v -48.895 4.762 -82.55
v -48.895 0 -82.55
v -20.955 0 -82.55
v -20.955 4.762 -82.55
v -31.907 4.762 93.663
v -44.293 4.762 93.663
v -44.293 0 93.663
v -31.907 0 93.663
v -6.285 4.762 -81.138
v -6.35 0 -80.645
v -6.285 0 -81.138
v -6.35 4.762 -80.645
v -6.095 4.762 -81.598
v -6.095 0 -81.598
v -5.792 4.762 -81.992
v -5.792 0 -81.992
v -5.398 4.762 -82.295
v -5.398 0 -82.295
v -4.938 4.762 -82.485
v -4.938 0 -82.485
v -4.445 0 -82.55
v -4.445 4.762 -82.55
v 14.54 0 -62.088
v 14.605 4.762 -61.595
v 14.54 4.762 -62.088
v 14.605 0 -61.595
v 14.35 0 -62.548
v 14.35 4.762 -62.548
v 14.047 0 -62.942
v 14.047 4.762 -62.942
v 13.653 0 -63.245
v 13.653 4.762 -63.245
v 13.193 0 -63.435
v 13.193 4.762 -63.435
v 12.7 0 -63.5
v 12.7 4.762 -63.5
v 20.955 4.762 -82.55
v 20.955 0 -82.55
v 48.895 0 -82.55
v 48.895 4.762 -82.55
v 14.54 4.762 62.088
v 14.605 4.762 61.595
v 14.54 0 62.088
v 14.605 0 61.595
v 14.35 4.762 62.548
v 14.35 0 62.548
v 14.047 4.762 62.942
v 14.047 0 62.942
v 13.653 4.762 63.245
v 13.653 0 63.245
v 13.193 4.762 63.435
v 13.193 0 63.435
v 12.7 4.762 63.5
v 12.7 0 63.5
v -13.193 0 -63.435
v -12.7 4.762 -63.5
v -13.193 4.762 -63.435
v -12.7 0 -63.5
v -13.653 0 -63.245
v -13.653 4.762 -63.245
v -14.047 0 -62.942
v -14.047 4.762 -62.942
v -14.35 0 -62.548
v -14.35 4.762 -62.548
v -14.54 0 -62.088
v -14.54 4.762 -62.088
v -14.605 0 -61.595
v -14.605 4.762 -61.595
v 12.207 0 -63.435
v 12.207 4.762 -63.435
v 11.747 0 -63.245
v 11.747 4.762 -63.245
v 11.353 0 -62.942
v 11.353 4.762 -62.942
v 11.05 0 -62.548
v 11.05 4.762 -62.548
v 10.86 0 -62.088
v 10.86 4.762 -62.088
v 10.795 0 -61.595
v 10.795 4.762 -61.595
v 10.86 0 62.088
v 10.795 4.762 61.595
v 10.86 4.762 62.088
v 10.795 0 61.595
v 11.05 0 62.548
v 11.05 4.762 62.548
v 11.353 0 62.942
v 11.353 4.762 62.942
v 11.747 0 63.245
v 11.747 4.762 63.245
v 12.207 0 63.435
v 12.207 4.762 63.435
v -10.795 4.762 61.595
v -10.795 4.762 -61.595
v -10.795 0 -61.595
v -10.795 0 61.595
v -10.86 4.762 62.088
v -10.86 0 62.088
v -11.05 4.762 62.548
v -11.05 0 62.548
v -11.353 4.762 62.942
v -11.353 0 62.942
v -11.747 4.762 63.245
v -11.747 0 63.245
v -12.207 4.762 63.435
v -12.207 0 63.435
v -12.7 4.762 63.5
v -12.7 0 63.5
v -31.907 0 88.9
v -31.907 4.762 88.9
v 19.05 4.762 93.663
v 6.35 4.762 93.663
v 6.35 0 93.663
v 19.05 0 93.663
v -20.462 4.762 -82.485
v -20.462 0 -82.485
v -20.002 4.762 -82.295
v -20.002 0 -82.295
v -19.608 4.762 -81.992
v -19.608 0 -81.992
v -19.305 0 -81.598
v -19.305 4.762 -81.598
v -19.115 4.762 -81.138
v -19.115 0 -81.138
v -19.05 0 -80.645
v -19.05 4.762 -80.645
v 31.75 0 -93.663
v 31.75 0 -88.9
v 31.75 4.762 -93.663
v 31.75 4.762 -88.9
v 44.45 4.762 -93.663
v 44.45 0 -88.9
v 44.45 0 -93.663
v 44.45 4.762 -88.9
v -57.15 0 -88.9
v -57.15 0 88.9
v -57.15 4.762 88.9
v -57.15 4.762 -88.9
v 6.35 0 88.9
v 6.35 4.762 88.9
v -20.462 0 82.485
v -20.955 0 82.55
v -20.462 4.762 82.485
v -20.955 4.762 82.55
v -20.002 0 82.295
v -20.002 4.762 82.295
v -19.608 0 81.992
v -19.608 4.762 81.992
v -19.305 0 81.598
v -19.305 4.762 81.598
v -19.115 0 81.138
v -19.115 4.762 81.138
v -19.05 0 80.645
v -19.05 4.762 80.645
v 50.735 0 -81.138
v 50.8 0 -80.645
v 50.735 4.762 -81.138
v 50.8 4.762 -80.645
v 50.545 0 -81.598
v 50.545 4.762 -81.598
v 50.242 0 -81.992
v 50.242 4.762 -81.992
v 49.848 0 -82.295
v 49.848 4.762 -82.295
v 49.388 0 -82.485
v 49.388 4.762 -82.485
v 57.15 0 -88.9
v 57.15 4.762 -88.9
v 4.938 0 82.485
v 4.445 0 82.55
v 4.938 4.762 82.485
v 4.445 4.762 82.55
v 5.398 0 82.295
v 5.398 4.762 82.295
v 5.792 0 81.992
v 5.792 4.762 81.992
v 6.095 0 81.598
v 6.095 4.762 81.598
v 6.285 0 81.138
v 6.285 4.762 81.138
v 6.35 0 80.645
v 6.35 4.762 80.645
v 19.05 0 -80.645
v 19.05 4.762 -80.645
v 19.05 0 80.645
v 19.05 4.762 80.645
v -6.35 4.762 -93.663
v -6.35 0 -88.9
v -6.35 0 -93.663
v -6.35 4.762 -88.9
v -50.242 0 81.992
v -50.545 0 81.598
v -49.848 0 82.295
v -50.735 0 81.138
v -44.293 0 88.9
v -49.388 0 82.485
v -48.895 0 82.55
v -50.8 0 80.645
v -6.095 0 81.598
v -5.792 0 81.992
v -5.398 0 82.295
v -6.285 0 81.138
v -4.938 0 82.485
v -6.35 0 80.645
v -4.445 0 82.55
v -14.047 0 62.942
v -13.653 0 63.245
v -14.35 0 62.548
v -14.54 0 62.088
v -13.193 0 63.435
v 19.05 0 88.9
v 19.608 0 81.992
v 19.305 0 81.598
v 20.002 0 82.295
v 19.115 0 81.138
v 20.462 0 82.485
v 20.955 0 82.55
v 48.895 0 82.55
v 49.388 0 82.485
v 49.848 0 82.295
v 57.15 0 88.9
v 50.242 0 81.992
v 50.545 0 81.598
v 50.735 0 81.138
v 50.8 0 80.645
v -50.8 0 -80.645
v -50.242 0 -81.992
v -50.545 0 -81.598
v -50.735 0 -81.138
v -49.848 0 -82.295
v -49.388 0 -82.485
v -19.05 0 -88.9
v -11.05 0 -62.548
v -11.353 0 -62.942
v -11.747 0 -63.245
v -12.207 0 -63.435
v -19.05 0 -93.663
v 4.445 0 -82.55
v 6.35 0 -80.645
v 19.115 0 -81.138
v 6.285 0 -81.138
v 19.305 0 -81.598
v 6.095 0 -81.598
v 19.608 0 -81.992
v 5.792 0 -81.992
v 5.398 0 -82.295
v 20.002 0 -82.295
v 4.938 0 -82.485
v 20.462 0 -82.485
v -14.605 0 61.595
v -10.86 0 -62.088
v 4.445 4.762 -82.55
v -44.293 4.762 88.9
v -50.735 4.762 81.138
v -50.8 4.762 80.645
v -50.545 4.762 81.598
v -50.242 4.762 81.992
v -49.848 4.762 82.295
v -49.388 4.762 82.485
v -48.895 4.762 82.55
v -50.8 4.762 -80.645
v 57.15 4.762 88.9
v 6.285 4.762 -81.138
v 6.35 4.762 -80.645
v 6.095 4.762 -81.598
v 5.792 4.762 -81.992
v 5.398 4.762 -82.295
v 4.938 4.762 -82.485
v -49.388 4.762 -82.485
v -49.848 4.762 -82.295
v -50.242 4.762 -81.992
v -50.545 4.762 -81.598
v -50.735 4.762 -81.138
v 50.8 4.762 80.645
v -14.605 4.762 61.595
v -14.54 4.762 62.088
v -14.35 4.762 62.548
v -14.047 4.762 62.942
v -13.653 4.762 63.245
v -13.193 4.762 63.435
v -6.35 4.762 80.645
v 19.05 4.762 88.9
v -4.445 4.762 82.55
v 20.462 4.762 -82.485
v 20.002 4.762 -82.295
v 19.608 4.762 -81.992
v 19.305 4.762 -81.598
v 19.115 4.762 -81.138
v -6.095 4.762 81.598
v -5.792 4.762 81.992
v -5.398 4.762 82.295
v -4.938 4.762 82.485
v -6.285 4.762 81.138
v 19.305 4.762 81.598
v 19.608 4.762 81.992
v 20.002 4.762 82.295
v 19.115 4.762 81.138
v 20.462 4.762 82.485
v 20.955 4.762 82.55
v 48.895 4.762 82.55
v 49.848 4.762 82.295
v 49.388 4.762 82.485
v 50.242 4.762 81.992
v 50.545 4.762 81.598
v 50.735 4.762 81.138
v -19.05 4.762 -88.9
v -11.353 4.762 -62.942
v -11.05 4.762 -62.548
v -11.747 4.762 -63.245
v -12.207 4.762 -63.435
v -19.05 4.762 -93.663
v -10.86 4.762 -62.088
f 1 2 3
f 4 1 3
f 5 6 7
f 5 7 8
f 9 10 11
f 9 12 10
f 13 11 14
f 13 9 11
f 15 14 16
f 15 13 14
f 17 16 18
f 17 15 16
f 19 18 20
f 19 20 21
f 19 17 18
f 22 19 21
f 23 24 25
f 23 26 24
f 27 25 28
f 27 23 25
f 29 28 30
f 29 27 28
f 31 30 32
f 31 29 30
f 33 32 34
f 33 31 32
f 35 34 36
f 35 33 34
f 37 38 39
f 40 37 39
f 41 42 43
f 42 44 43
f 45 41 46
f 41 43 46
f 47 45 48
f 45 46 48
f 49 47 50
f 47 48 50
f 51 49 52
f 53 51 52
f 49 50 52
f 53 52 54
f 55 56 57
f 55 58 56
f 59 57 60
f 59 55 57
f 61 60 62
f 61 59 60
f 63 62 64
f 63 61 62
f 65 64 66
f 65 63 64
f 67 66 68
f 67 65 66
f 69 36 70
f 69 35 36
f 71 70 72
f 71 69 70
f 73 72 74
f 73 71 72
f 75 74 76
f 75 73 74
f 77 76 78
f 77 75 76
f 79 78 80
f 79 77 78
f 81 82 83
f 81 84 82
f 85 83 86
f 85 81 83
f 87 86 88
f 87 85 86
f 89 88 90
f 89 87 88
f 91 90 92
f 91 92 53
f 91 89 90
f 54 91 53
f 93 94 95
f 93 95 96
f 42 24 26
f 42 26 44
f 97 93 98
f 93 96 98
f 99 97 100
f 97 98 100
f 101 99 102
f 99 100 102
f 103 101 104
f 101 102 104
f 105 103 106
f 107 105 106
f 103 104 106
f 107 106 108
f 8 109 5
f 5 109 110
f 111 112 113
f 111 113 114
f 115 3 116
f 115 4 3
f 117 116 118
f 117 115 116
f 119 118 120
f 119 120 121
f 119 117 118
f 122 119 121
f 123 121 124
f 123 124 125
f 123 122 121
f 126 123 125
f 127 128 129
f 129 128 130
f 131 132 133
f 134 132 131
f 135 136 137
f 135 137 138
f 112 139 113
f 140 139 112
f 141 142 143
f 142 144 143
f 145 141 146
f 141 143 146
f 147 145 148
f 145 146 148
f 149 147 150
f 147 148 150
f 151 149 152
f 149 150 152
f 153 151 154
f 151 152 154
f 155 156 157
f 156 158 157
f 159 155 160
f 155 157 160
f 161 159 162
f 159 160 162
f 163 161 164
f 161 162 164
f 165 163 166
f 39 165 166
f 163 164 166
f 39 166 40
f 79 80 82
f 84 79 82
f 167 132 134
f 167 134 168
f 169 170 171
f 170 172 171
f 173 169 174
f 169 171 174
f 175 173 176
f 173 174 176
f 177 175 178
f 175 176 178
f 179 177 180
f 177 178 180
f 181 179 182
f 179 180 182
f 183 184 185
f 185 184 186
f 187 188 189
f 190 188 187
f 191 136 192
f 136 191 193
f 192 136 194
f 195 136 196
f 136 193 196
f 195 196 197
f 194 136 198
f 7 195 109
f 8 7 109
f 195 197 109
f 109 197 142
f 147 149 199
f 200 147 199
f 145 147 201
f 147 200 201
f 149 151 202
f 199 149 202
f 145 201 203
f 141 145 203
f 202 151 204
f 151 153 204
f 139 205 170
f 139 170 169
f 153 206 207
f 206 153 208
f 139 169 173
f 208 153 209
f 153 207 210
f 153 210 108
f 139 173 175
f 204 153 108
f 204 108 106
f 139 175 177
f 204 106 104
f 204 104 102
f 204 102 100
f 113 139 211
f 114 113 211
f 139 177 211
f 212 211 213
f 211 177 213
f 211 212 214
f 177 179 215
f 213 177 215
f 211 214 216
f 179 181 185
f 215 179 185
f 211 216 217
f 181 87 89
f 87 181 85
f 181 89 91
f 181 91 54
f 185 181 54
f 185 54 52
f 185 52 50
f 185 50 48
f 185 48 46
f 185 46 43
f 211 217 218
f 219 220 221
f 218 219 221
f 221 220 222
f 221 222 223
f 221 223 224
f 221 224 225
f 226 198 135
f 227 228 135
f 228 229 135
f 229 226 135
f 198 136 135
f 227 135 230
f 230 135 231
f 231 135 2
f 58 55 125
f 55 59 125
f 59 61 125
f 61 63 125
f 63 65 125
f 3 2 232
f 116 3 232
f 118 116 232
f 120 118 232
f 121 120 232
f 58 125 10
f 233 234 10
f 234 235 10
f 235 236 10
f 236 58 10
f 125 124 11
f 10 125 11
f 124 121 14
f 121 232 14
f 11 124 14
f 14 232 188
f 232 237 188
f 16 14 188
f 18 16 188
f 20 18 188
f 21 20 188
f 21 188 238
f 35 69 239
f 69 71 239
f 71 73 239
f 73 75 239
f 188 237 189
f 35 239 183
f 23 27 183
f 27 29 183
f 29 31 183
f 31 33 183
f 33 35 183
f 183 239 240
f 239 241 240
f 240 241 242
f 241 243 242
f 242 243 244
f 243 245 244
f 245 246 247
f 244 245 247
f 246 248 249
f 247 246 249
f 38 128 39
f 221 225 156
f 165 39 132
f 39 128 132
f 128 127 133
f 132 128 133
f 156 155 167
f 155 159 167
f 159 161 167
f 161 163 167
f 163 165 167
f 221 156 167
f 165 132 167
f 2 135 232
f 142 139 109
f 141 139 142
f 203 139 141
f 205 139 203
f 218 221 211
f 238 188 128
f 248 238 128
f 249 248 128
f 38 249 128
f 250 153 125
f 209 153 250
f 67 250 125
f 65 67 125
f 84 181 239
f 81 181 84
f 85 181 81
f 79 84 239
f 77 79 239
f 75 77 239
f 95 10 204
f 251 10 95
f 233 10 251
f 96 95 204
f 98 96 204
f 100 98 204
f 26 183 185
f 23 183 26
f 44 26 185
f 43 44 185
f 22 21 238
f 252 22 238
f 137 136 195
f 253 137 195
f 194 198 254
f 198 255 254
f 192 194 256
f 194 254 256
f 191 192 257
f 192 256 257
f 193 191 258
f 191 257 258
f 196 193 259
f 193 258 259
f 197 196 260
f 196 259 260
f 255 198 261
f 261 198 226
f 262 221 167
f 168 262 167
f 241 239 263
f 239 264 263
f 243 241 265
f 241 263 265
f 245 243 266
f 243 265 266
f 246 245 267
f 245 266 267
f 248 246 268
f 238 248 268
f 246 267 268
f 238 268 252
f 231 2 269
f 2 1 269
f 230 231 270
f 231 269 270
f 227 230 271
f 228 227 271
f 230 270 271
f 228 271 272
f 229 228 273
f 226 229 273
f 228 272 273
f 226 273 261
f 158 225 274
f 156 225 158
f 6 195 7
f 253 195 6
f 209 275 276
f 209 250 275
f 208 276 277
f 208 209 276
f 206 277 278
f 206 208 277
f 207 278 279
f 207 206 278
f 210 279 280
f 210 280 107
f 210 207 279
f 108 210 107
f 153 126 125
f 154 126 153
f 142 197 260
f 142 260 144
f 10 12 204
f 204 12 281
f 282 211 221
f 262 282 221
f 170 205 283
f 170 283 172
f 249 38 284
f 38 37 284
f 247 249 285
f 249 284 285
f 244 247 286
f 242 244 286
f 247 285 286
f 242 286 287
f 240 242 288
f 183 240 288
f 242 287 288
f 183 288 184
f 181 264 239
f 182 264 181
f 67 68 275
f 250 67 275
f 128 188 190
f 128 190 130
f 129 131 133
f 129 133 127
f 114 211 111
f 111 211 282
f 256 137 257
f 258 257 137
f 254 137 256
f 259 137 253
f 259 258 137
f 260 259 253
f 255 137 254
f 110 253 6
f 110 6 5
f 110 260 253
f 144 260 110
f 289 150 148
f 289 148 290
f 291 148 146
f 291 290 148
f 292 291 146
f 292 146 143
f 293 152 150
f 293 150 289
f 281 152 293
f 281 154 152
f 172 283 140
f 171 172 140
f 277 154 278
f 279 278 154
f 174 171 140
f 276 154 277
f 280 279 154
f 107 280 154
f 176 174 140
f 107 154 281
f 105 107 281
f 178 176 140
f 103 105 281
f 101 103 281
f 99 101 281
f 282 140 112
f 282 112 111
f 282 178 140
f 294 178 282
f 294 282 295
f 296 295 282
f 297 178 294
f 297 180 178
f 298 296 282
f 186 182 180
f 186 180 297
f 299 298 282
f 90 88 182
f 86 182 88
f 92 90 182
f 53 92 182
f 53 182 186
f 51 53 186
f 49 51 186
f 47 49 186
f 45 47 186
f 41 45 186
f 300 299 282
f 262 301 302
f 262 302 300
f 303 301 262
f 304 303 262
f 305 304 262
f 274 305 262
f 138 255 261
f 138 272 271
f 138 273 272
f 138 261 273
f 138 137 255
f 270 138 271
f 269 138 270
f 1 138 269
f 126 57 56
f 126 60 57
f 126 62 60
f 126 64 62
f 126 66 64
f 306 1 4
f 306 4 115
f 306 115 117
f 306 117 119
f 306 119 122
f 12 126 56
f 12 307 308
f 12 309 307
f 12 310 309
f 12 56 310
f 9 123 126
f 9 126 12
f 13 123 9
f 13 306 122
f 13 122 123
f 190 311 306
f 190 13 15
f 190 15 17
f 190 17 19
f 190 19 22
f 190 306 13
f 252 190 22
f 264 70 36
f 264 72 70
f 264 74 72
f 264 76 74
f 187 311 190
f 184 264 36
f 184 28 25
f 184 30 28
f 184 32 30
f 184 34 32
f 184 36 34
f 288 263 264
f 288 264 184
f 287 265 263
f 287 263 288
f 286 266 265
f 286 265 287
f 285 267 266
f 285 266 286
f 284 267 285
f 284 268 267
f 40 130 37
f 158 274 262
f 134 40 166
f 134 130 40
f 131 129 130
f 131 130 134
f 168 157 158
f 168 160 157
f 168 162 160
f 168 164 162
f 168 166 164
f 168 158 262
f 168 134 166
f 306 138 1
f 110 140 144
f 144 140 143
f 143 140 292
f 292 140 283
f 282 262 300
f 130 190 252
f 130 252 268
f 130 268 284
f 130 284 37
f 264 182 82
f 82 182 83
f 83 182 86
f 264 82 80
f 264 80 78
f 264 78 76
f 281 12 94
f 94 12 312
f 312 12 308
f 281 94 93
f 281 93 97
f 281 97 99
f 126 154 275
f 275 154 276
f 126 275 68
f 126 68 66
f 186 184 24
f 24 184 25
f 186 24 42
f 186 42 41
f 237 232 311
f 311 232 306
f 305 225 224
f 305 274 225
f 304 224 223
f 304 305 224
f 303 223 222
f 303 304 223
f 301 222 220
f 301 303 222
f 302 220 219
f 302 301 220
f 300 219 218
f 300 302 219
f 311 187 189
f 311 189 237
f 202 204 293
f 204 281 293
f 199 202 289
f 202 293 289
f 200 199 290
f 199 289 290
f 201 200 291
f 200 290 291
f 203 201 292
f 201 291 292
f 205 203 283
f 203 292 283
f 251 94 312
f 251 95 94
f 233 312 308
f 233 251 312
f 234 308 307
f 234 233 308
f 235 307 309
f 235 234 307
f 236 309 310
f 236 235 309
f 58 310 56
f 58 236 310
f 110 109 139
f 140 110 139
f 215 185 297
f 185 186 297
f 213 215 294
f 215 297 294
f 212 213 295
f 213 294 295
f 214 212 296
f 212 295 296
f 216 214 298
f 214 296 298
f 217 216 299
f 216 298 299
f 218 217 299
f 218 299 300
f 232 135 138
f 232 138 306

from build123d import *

# Parameters (mm, degrees)
SKETCH1_W           = 114.3
SKETCH1_H           = 177.8
SKETCH1_W_2         = 101.6
SKETCH1_H_2         = 165.1
BOSS_EXTRUDE1_DEPTH = 4.7625
SKETCH2_W           = 12.38677804
SKETCH2_H           = 4.7625
SKETCH2_W_2         = 12.7
BOSS_EXTRUDE2_DEPTH = 4.7625
SKETCH3_W           = 12.7
SKETCH3_H           = 4.7625
BOSS_EXTRUDE3_DEPTH = 4.7625
SKETCH4_W           = 12.7
SKETCH4_H           = 177.8
SKETCH4_W_2         = 3.81
SKETCH4_H_2         = 127
BOSS_EXTRUDE4_DEPTH = 4.7625
FILLET1_R           = 1.905


with BuildPart() as part:
    # Sketch1 → Boss-Extrude1 (new body)
    with BuildSketch(Plane(origin=(0, 0, 0), x_dir=(1, 0, 0), z_dir=(0, 1, 0))):
        Rectangle(SKETCH1_W, SKETCH1_H)
        Rectangle(SKETCH1_W_2, SKETCH1_H_2, mode=Mode.SUBTRACT)
    extrude(amount=BOSS_EXTRUDE1_DEPTH)

    # Sketch2 → Boss-Extrude2 (add)
    with BuildSketch(Plane.XY.offset(88.9)):
        with Locations((-38.1, 2.38125)):
            Rectangle(SKETCH2_W, SKETCH2_H)
        with Locations((12.7, 2.38125)):
            Rectangle(SKETCH2_W_2, SKETCH2_H)
    extrude(amount=BOSS_EXTRUDE2_DEPTH)

    # Sketch3 → Boss-Extrude3 (add)
    with BuildSketch(Plane(origin=(0, 0, -88.9), x_dir=(-1, 0, 0), z_dir=(0, 0, -1))):
        with Locations((-38.1, 2.38125)):
            Rectangle(SKETCH3_W, SKETCH3_H)
        with Locations((12.7, 2.38125)):
            Rectangle(SKETCH3_W, SKETCH3_H)
    extrude(amount=BOSS_EXTRUDE3_DEPTH)

    # Sketch4 → Boss-Extrude4 (add)
    # profile 1 of 2: a face of its own
    with BuildSketch(Plane(origin=(0, 4.7625, 0), x_dir=(-1, 0, 0), z_dir=(0, 1, 0))):
        with Locations((12.7, 0)):
            Rectangle(SKETCH4_W, SKETCH4_H)
        with Locations((12.7, 0)):
            Rectangle(SKETCH4_W_2, SKETCH4_H_2, mode=Mode.SUBTRACT)
    # profile 2 of 2: a face of its own
    with BuildSketch(Plane(origin=(0, 4.7625, 0), x_dir=(-1, 0, 0), z_dir=(0, 1, 0))):
        with Locations((-12.7, 0)):
            Rectangle(SKETCH4_W, SKETCH4_H)
        with Locations((-12.7, 0)):
            Rectangle(SKETCH4_W_2, SKETCH4_H_2, mode=Mode.SUBTRACT)
    extrude(amount=-BOSS_EXTRUDE4_DEPTH)

    # Fillet1
    fillet1_edges = [part.edges().sort_by_distance(p)[0] for p in [
        (-10.795, 2.38125, -63.5),
        (-14.605, 2.38125, -63.5),
        (10.795, 2.38125, -63.5),
        (14.605, 2.38125, -63.5),
        (-10.795, 2.38125, 63.5),
        (-14.605, 2.38125, 63.5),
        (10.795, 2.38125, 63.5),
        (14.605, 2.38125, 63.5),
        (-6.35, 2.38125, 82.55),
        (6.35, 2.38125, 82.55),
        (-6.35, 2.38125, -82.55),
        (6.35, 2.38125, -82.55),
        (-19.05, 2.38125, -82.55),
        (-50.8, 2.38125, -82.55),
        (-50.8, 2.38125, 82.55),
        (-19.05, 2.38125, 82.55),
        (19.05, 2.38125, 82.55),
        (50.8, 2.38125, 82.55),
        (19.05, 2.38125, -82.55),
        (50.8, 2.38125, -82.55),
    ]]
    fillet(fillet1_edges, radius=FILLET1_R - 0.0001)  # a hair under: the kernel refuses the full size


solid = part.part
